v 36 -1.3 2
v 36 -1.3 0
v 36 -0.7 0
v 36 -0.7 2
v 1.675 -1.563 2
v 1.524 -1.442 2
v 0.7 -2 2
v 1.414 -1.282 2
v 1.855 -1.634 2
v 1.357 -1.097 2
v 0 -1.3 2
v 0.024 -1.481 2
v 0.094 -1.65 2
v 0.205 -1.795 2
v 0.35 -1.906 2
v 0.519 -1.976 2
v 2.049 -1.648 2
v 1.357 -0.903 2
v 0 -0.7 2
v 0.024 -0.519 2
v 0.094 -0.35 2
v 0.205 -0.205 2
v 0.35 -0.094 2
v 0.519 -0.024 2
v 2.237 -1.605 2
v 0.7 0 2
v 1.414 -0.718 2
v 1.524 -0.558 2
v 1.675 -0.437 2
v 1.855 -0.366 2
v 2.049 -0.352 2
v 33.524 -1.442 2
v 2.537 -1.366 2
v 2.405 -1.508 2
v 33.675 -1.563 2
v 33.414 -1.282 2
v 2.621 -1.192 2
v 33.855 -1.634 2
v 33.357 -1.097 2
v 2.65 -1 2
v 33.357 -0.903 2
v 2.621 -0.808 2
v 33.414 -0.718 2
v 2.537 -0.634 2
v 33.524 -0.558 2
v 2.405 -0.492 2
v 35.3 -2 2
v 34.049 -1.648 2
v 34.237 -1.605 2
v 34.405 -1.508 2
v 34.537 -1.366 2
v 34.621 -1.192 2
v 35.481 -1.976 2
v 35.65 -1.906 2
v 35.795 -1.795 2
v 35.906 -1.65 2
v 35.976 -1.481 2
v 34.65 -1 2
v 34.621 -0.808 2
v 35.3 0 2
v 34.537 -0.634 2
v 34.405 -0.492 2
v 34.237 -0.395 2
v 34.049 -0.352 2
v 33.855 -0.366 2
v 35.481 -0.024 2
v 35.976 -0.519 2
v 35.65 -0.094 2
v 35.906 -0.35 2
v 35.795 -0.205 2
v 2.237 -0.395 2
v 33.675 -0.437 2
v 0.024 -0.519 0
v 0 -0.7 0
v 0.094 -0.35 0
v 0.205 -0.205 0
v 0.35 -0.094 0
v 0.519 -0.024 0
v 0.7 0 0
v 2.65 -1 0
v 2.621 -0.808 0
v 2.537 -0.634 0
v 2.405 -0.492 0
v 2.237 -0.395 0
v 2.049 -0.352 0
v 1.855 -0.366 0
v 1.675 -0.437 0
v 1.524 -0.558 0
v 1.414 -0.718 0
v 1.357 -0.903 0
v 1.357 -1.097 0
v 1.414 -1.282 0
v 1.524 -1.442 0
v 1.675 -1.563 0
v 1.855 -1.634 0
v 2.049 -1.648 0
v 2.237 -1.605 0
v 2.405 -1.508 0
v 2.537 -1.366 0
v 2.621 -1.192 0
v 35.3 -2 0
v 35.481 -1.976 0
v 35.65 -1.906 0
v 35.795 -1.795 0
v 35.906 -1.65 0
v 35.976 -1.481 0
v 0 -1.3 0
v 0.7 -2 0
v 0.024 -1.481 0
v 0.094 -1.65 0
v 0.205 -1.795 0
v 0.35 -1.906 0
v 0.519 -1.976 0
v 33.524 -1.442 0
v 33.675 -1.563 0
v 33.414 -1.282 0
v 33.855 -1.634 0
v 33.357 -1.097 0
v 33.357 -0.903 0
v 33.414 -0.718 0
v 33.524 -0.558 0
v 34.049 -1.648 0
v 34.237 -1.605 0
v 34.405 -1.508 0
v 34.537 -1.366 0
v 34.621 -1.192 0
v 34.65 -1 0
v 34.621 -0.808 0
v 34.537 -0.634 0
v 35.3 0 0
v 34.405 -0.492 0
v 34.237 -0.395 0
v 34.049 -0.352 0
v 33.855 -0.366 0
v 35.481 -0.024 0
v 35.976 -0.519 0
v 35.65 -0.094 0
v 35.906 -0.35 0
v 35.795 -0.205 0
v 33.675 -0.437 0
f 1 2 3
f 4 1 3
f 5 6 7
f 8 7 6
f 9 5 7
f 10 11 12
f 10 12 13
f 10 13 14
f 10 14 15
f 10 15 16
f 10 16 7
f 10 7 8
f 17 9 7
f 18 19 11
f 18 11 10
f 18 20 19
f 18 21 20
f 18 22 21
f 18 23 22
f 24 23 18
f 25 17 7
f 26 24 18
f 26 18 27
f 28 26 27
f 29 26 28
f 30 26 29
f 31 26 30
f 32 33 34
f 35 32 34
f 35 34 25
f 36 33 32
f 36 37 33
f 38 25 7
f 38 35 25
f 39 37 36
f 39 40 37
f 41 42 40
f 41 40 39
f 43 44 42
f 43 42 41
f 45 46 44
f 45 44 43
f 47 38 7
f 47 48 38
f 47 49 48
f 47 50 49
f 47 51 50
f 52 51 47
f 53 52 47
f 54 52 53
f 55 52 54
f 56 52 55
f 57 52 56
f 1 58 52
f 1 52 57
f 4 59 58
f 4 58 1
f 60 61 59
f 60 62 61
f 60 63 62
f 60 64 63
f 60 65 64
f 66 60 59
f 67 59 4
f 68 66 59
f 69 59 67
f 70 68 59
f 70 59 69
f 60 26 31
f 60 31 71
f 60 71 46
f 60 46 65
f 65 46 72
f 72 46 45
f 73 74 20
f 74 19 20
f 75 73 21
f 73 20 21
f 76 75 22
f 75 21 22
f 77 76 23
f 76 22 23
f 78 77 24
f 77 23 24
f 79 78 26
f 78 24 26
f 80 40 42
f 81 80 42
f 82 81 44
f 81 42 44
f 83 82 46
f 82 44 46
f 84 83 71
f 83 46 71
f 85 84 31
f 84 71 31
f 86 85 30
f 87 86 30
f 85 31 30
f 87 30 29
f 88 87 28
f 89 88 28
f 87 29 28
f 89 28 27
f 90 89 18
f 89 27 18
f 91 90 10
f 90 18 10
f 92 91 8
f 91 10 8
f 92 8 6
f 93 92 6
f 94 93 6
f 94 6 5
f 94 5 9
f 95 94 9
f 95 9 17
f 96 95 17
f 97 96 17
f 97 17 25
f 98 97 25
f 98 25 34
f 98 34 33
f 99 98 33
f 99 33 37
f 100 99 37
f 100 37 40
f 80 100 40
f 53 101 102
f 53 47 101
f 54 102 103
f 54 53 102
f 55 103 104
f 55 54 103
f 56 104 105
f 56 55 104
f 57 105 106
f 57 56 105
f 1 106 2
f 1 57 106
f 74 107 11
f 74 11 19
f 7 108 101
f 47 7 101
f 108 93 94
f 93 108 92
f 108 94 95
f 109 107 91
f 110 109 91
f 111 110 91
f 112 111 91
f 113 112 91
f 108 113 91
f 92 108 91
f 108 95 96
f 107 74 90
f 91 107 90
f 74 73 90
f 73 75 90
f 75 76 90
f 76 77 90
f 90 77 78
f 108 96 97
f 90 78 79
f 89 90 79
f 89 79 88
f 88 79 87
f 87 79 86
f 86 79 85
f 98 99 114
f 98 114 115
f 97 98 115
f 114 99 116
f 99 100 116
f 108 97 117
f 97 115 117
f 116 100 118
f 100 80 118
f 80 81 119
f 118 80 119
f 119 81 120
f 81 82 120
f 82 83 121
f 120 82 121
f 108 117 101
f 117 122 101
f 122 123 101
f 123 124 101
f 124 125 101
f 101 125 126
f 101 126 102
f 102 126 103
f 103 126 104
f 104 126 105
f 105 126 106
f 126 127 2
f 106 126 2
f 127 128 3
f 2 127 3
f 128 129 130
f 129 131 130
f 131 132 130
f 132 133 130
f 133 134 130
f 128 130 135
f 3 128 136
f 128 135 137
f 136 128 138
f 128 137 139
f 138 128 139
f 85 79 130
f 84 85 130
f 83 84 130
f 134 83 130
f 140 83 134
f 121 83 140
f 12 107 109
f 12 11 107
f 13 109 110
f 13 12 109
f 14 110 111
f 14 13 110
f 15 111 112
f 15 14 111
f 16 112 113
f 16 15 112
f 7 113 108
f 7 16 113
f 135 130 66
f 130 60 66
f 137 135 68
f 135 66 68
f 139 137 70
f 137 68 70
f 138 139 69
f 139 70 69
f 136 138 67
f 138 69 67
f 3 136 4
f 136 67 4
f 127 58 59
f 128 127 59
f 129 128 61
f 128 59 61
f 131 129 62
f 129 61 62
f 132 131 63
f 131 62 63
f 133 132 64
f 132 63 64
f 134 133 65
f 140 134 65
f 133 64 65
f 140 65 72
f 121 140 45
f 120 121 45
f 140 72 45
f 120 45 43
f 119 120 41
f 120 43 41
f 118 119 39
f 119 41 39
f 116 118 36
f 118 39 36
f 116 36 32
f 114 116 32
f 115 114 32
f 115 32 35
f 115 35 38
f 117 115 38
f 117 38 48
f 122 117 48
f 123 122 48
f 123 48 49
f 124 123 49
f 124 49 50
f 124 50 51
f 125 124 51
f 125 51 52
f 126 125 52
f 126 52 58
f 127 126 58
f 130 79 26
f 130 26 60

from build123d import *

# Parameters (mm, degrees)
SKETCH003_W     = 36
SKETCH003_H     = 2
PAD_DEPTH       = 2
SKETCH004_R     = 0.65
POCKET001_DEPTH = 5
FILLET_R        = 0.7


with BuildPart() as part:
    # Sketch003 → Pad (new body)
    with BuildSketch(Plane.XY):
        with Locations((18, -1)):
            Rectangle(SKETCH003_W, SKETCH003_H)
    extrude(amount=PAD_DEPTH)

    # Sketch004 (on Face6 of Pad) → Pocket001 (cut)
    with BuildSketch(Plane.XY.offset(2)):
        with Locations((2, -1)):
            Circle(SKETCH004_R)
        with Locations((34, -1)):
            Circle(SKETCH004_R)
    extrude(amount=-POCKET001_DEPTH, mode=Mode.SUBTRACT)

    # Fillet
    fillet_edges = [part.edges().sort_by_distance(p)[0] for p in [
        (0, 0, 1),
        (0, -2, 1),
        (36, -2, 1),
        (36, 0, 1),
    ]]
    fillet(fillet_edges, radius=FILLET_R)


solid = part.part
